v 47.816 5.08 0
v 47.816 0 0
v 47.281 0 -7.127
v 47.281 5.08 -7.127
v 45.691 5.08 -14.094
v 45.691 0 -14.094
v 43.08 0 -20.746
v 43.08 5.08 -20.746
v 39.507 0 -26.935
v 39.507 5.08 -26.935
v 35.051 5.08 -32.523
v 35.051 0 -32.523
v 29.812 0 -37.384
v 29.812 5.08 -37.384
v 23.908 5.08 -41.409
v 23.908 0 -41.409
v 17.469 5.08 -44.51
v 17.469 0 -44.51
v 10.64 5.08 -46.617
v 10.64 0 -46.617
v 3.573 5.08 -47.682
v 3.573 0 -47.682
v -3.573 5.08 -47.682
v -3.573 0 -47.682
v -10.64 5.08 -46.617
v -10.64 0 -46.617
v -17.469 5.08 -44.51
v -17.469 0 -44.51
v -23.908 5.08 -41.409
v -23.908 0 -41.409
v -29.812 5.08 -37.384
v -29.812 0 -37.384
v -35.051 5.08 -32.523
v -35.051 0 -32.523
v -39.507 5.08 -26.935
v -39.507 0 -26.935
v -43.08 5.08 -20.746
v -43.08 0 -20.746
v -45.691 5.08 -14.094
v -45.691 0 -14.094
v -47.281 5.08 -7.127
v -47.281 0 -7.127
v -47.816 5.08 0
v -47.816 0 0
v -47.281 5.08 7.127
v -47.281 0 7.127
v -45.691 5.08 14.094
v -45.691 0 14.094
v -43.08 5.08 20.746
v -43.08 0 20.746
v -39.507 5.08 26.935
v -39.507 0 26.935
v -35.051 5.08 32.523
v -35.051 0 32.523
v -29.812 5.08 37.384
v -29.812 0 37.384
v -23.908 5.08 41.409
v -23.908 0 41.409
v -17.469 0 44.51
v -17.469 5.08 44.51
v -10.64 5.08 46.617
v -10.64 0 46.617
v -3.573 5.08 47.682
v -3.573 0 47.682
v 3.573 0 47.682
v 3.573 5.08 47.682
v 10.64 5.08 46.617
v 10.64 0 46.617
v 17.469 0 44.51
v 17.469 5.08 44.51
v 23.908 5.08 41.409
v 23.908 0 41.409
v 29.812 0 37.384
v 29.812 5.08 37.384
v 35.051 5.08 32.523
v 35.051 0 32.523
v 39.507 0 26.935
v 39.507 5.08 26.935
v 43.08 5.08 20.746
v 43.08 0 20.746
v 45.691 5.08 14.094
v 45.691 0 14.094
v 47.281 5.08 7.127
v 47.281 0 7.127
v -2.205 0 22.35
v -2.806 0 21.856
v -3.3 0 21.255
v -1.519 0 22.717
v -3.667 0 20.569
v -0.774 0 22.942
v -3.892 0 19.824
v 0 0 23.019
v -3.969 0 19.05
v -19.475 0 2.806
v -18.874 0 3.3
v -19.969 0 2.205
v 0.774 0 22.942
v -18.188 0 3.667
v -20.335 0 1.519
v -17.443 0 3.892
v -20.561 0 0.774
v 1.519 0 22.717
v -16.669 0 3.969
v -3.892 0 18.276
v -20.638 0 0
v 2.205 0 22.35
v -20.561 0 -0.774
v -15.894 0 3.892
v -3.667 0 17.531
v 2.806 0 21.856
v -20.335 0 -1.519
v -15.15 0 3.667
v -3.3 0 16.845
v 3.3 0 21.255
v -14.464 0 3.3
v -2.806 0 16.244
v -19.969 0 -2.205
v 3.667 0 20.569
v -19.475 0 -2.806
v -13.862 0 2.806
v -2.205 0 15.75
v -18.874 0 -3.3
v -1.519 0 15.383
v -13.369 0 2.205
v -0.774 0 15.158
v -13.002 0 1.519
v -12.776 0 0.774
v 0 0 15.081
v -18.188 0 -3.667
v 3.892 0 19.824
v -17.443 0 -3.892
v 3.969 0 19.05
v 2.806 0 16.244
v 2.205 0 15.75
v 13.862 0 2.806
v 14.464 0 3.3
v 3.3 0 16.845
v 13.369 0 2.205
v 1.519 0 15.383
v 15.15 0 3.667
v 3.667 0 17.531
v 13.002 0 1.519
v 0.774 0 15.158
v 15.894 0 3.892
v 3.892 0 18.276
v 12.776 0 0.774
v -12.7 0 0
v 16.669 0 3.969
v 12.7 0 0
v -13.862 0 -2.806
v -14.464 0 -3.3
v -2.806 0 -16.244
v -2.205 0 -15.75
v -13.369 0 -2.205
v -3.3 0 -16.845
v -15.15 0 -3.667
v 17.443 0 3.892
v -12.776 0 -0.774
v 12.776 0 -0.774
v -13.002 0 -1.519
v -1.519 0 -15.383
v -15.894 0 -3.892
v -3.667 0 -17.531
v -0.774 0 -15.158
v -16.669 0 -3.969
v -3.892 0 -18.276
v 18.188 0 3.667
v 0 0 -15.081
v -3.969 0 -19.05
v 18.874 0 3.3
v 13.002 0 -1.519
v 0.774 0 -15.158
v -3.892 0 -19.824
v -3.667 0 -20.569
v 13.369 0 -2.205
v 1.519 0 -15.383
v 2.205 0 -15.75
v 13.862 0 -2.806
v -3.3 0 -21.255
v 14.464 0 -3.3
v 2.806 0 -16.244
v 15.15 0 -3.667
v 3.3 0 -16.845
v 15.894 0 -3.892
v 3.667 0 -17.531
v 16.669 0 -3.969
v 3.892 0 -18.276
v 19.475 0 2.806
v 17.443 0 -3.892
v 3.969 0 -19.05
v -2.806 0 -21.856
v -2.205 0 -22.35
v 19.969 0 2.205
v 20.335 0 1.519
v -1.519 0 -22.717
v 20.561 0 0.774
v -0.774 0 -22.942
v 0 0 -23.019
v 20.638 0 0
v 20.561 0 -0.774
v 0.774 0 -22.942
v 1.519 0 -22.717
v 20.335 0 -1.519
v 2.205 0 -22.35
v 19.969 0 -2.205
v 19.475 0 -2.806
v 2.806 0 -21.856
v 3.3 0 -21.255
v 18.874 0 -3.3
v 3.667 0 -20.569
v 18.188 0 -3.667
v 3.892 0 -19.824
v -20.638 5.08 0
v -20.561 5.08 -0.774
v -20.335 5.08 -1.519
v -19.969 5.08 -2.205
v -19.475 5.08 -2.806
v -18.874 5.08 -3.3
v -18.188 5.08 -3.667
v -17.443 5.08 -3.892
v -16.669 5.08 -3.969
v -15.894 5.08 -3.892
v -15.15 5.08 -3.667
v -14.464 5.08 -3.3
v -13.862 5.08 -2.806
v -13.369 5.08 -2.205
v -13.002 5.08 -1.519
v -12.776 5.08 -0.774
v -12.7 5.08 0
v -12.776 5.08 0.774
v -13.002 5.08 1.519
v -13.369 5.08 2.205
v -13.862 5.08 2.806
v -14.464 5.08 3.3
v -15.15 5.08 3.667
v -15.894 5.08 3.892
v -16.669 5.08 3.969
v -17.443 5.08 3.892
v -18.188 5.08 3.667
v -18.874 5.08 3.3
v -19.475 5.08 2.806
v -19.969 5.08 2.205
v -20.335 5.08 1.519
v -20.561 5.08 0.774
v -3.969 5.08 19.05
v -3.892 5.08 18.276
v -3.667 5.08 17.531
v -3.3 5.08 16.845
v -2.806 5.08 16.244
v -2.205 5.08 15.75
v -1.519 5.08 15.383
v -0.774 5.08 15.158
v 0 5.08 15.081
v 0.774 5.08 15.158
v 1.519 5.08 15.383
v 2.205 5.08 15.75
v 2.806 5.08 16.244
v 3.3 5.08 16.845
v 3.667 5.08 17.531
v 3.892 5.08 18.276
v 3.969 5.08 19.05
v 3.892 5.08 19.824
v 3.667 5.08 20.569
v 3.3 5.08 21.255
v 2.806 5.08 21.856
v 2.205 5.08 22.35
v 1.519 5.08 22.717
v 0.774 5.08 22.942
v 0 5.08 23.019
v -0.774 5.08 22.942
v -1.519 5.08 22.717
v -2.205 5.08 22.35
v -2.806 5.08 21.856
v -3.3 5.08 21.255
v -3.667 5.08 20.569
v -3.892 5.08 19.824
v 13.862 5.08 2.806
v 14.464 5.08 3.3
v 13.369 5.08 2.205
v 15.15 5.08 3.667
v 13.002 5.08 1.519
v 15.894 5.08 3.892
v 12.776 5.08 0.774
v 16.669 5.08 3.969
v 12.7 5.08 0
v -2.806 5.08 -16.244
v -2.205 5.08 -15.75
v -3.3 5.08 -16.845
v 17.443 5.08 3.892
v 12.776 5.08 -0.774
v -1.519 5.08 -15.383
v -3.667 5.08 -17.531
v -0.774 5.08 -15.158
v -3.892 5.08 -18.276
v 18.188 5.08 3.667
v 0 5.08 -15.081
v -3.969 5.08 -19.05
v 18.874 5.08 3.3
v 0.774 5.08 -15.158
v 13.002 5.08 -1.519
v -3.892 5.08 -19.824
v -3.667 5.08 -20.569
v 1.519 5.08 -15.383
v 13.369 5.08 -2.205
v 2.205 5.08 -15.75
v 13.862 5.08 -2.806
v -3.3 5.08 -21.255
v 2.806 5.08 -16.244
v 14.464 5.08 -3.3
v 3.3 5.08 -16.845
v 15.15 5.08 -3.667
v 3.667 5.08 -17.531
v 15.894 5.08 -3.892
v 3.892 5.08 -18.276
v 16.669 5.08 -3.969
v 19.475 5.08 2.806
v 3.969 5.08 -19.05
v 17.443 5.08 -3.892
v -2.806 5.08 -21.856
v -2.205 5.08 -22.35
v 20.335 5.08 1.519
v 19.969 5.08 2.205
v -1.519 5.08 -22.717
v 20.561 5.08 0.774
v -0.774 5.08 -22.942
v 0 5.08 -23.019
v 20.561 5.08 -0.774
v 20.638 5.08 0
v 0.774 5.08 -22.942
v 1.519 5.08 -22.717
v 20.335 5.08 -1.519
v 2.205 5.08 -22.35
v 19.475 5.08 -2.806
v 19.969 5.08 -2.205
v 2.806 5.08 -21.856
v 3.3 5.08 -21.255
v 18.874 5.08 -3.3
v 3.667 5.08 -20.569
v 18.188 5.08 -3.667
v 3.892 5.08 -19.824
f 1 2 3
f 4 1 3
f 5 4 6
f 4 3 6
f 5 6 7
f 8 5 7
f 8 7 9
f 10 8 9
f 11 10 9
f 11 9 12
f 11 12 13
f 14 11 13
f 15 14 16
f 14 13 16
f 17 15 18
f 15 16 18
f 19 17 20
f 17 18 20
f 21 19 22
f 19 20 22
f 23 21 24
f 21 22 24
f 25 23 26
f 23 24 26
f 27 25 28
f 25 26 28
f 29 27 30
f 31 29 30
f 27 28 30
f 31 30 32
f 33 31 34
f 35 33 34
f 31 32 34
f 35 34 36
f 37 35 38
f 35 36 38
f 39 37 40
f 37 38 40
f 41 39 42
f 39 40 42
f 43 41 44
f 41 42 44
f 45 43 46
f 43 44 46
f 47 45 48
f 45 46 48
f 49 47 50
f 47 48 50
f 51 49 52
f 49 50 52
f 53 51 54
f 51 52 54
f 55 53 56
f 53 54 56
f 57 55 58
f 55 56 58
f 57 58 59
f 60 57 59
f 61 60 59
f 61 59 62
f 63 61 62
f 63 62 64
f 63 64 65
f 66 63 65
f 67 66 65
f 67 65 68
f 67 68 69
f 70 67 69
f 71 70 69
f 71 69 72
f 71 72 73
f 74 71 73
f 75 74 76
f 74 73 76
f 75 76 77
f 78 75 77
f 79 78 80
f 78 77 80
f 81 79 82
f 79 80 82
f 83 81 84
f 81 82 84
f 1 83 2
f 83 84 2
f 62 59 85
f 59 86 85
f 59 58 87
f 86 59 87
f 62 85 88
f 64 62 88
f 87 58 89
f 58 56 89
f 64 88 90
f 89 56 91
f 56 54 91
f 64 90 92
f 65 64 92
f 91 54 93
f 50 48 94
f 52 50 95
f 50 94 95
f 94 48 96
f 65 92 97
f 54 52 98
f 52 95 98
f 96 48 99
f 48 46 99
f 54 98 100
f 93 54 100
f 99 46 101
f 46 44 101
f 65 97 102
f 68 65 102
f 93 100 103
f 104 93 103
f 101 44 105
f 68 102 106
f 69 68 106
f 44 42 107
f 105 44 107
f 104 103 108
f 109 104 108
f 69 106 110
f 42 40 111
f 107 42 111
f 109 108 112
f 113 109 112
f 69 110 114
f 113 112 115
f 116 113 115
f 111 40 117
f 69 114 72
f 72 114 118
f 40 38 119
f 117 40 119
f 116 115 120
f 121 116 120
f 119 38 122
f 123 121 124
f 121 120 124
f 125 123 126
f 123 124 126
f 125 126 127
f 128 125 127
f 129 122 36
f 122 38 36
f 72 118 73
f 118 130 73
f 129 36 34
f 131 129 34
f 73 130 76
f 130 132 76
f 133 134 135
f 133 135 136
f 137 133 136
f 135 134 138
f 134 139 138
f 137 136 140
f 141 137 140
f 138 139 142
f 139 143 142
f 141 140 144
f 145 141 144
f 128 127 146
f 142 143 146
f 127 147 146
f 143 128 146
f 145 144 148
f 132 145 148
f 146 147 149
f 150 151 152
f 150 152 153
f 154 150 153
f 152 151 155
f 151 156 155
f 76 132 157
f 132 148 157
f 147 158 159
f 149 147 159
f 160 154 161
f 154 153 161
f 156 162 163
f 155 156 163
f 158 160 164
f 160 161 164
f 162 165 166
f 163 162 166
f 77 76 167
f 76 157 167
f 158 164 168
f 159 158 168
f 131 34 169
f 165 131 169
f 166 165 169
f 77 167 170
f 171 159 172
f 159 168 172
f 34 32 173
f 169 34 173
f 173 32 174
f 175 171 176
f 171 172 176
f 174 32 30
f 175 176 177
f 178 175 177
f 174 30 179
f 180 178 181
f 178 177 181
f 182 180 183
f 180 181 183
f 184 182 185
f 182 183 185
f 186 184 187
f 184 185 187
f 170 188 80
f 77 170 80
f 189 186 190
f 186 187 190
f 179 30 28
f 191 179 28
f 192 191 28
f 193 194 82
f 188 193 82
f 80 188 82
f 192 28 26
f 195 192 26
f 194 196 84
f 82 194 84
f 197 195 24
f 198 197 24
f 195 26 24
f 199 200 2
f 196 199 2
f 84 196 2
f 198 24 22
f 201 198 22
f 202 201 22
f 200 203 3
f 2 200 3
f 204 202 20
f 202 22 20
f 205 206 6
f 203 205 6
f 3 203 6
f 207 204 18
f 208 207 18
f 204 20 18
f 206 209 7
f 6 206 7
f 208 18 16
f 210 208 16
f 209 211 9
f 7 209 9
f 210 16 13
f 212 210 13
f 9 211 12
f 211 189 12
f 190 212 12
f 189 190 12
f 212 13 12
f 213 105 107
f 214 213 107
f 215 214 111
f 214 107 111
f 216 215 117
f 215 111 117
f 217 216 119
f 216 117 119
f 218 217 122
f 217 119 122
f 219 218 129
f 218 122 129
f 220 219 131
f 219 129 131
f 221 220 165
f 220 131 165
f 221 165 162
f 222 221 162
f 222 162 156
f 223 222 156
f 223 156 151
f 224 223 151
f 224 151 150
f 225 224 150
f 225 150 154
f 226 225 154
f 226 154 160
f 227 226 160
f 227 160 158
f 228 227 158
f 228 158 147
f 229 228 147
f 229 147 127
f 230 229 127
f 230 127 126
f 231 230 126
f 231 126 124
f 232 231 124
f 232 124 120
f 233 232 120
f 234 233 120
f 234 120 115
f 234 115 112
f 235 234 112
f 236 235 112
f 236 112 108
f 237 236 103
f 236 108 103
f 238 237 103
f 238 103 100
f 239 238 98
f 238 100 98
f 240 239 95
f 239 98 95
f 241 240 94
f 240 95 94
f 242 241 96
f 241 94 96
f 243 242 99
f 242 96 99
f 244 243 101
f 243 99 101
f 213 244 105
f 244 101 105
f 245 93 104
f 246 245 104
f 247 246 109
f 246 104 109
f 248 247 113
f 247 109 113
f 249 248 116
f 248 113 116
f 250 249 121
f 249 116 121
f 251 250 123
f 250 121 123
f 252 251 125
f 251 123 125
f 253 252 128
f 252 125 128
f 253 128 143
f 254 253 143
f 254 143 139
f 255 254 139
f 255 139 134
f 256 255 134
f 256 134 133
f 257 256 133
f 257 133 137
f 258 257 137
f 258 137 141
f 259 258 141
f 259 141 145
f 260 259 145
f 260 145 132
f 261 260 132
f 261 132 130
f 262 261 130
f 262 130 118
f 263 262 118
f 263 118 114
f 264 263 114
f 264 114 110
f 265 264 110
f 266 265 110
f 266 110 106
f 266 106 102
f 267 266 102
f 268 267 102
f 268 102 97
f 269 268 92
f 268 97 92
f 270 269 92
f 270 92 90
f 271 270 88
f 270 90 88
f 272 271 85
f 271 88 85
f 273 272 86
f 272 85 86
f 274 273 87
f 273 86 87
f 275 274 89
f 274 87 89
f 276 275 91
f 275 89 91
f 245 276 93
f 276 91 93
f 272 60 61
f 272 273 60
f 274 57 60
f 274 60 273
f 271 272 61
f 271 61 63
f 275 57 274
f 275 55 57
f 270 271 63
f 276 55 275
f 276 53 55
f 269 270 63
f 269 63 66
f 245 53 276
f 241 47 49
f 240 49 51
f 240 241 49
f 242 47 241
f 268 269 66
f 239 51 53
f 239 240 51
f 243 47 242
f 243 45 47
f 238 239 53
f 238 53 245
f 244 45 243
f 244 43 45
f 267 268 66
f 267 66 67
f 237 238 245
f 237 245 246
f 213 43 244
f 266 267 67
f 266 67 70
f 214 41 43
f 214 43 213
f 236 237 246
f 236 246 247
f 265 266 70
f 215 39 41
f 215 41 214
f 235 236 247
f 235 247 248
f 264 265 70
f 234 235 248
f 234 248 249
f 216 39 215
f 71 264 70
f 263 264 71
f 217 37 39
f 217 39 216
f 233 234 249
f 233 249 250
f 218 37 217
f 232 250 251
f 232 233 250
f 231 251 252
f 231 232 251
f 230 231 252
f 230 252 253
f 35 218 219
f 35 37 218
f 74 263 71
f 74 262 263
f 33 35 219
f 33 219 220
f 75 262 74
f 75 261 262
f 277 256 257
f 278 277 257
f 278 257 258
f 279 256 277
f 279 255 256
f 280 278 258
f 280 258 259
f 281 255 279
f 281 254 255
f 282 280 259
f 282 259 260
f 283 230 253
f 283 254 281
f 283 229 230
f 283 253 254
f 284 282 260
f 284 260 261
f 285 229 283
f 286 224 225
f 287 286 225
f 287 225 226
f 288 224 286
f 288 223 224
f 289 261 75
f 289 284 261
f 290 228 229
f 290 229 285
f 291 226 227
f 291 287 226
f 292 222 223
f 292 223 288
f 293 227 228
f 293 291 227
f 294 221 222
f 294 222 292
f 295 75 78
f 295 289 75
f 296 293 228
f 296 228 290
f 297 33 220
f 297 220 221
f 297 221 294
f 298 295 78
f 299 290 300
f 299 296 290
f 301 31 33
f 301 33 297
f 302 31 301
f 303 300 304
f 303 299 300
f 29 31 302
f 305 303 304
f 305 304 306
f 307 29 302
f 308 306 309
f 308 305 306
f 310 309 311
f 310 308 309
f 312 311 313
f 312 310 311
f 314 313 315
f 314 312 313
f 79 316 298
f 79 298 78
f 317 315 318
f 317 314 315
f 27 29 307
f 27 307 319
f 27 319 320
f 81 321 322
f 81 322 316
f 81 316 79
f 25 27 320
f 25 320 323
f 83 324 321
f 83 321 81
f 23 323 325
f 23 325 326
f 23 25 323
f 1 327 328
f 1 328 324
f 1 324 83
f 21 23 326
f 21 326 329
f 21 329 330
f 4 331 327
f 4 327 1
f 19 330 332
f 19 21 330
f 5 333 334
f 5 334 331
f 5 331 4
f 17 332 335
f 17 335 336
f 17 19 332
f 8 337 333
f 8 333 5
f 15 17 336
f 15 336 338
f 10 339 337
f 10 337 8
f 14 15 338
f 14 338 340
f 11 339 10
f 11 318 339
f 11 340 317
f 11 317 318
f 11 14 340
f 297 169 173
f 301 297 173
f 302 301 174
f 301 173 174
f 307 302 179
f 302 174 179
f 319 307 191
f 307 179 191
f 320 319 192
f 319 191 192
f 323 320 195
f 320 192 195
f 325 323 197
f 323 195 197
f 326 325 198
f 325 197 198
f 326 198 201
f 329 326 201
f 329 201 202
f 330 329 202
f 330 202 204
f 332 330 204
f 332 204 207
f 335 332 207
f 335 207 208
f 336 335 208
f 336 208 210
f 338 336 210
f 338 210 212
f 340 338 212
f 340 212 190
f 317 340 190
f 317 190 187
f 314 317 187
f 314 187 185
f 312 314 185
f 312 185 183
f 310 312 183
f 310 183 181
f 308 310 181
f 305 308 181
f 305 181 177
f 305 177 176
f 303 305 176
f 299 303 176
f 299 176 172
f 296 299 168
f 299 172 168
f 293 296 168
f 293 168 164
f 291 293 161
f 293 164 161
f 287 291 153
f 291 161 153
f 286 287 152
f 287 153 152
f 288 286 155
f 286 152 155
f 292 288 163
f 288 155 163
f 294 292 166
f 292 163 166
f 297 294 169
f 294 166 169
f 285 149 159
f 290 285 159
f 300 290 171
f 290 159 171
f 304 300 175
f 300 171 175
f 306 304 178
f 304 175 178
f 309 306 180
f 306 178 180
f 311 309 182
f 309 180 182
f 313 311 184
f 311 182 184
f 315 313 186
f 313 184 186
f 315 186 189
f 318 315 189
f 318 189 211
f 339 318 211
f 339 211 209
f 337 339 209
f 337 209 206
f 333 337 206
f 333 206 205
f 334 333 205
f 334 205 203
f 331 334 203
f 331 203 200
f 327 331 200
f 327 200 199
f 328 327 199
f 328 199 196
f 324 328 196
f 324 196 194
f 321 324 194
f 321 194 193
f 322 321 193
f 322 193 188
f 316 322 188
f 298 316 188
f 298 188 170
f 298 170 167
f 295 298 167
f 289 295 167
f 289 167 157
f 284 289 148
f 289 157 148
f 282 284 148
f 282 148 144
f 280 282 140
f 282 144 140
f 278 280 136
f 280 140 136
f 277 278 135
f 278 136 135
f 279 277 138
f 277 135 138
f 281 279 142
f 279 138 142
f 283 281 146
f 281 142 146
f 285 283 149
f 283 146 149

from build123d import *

# Parameters (mm, degrees)
SKETCH1_R            = 47.8155
BOSS_EXTRUDE1_DEPTH  = 5.08
U_BOLT_HOLES_D       = 7.9375
THREADED_ROD_HOLES_D = 7.9375


with BuildPart() as part:
    # Sketch1 → Boss-Extrude1 (new body)
    with BuildSketch(Plane(origin=(0, 0, 0), x_dir=(1, 0, 0), z_dir=(0, 1, 0))):
        Circle(SKETCH1_R)
    extrude(amount=BOSS_EXTRUDE1_DEPTH)

    # U-bolt Holes (through all)
    with Locations(Plane(origin=(0, 5.08, 0), x_dir=(1, 0, 0), z_dir=(0, 1, 0))):
        with Locations((-16.66875, 0), (16.66875, 0)):
            Hole(U_BOLT_HOLES_D / 2)

    # Threaded Rod Holes (through all)
    with Locations(Plane(origin=(0, 5.08, 0), x_dir=(1, 0, 0), z_dir=(0, 1, 0))):
        with Locations((0, 19.05), (0, -19.05)):
            Hole(THREADED_ROD_HOLES_D / 2)


solid = part.part
